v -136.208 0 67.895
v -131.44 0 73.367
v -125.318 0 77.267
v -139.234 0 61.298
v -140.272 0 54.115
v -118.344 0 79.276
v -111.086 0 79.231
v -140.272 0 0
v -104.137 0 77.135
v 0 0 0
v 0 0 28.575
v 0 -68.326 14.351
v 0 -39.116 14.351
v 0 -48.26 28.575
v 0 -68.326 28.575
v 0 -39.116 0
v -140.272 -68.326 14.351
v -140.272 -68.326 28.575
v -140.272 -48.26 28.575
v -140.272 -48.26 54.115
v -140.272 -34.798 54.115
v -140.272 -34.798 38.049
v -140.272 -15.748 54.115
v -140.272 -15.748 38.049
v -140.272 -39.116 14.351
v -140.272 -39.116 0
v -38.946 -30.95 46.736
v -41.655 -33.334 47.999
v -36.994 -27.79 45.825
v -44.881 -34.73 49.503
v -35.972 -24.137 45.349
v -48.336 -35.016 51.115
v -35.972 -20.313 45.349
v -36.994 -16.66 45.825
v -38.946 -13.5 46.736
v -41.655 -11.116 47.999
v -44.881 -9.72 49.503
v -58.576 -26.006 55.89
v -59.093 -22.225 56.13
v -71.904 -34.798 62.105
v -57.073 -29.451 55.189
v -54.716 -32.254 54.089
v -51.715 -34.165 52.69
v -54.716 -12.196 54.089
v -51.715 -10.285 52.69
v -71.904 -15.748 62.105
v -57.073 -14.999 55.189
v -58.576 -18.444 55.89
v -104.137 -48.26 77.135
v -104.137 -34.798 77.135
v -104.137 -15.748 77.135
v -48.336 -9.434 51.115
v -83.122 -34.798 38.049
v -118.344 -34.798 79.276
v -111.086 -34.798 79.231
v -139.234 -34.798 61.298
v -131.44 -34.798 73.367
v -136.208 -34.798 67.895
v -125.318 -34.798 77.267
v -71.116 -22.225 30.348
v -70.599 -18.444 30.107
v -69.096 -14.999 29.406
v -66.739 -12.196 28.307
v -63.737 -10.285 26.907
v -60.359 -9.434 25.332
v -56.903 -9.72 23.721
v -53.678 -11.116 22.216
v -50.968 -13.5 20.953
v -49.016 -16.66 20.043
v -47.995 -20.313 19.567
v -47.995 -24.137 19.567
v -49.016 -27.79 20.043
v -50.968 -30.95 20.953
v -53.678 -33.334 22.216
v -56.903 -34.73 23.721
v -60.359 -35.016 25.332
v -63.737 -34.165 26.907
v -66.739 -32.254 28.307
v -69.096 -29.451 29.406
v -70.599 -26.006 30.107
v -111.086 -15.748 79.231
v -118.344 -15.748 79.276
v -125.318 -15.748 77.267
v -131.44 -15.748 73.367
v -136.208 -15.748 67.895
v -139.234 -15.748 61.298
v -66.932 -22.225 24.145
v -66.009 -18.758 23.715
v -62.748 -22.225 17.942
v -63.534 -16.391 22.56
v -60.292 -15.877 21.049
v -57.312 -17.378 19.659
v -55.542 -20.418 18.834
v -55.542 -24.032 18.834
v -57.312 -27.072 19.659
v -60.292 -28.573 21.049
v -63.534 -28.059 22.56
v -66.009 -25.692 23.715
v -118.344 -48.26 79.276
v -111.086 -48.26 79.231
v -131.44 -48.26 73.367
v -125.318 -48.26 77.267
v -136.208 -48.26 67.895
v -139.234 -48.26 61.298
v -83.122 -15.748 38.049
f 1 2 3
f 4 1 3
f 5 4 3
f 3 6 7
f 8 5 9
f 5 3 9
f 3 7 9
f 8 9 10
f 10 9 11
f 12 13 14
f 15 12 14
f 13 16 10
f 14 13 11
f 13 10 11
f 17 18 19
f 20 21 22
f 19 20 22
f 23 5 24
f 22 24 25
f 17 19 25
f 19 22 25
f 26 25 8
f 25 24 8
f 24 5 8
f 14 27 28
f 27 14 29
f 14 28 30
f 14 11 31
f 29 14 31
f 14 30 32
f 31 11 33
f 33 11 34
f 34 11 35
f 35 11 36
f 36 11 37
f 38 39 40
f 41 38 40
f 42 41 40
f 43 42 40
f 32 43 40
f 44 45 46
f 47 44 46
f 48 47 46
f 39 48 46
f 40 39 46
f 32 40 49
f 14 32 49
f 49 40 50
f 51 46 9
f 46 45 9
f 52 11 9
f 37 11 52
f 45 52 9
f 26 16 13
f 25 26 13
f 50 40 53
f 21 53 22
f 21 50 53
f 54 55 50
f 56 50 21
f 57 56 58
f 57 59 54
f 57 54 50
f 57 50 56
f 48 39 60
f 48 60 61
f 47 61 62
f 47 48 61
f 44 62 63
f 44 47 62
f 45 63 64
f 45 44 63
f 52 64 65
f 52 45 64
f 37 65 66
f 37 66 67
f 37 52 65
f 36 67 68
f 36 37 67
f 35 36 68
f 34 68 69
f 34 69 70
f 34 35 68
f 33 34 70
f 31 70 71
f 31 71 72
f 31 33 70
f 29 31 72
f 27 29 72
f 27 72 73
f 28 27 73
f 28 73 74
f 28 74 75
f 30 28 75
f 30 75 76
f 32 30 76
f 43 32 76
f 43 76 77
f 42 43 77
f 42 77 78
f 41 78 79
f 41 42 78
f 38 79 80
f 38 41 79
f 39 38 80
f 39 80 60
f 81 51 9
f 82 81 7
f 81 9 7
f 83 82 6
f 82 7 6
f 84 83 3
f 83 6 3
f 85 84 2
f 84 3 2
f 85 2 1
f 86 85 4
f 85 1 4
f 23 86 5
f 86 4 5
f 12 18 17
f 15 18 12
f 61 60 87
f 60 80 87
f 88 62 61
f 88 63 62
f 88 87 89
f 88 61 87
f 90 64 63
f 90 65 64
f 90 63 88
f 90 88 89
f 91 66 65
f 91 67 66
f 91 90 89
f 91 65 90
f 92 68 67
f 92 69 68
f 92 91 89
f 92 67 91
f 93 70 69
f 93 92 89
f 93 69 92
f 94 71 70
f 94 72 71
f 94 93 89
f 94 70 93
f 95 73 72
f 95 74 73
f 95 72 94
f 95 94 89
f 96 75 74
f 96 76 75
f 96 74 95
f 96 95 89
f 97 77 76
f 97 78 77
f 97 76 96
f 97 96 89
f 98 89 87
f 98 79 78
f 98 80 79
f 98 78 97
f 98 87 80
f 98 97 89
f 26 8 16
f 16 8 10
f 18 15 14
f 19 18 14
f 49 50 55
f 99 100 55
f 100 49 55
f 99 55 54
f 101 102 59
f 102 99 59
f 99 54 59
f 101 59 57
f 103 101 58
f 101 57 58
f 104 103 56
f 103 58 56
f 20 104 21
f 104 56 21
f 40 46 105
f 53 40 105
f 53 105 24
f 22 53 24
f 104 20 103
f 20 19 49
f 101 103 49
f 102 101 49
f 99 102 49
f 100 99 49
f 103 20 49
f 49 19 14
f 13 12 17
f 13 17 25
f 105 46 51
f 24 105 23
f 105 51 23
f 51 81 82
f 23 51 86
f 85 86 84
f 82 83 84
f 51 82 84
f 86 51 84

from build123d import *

# Parameters (mm, degrees)
F1_DEPTH = 68.326
F2_W     = 87.6199703779
F2_H     = 65.060084963
F2_W_2   = 70.4743001366
F2_H_2   = 87.6017467856
F3_DEPTH = 140.2725
F9_DEPTH = 19.05


with BuildPart() as f1:
    # F0 (on Front) → F1 (new body)
    with BuildSketch(Plane.XZ):
        with BuildLine():
            Line((-140.2715, 0), (0, 0))
            Line((0, 0), (0, 28.575))
            Line((0, 28.575), (-104.1369961518, 77.1348788028))
            ThreePointArc((-104.1369961518, 77.1348788028), (-128.518910052, 75.5368037358), (-140.2715, 54.1146610121))
            Line((-140.2715, 54.1146610121), (-140.2715, 0))
        make_face()
    extrude(amount=F1_DEPTH)

    # F2 (on Right) → F3 (cut, through all)
    with BuildSketch(Plane.YZ):
        with Locations((-82.925985189, -18.1790424815)):
            Rectangle(F2_W, F2_H)
        with Locations((-83.4971500683, 72.3758733928)):
            Rectangle(F2_W_2, F2_H_2)
    extrude(amount=-F3_DEPTH, mode=Mode.SUBTRACT)

    # F5 (on offset) → F6 (revolve, cut)
    with BuildSketch(Plane(origin=(0, -22.225, 0), x_dir=(-1, 0, 0), z_dir=(0, 1, 0))):
        Polygon((71.1155433788, 30.3478274527), (50.8693131181, 73.7660083611), (39.2441031338, 68.3450839177), (62.7475534112, 17.9417721419), align=None)
    revolve(axis=Axis((-50.9958282725, -22.225, 43.1434280298), (-0.4226182617, 0, -0.906307787)), mode=Mode.SUBTRACT)

    # F8 (on offset) → F9 (cut)
    with BuildSketch(Plane(origin=(0, -15.748, 0), x_dir=(-1, 0, 0), z_dir=(0, 1, 0))):
        Polygon((164.5451933146, 38.0492), (164.5451933146, 123.7454637885), (43.1606759201, 123.7454637885), (83.1215, 38.0492), align=None)
    extrude(amount=-F9_DEPTH, mode=Mode.SUBTRACT)


solid = f1.part
